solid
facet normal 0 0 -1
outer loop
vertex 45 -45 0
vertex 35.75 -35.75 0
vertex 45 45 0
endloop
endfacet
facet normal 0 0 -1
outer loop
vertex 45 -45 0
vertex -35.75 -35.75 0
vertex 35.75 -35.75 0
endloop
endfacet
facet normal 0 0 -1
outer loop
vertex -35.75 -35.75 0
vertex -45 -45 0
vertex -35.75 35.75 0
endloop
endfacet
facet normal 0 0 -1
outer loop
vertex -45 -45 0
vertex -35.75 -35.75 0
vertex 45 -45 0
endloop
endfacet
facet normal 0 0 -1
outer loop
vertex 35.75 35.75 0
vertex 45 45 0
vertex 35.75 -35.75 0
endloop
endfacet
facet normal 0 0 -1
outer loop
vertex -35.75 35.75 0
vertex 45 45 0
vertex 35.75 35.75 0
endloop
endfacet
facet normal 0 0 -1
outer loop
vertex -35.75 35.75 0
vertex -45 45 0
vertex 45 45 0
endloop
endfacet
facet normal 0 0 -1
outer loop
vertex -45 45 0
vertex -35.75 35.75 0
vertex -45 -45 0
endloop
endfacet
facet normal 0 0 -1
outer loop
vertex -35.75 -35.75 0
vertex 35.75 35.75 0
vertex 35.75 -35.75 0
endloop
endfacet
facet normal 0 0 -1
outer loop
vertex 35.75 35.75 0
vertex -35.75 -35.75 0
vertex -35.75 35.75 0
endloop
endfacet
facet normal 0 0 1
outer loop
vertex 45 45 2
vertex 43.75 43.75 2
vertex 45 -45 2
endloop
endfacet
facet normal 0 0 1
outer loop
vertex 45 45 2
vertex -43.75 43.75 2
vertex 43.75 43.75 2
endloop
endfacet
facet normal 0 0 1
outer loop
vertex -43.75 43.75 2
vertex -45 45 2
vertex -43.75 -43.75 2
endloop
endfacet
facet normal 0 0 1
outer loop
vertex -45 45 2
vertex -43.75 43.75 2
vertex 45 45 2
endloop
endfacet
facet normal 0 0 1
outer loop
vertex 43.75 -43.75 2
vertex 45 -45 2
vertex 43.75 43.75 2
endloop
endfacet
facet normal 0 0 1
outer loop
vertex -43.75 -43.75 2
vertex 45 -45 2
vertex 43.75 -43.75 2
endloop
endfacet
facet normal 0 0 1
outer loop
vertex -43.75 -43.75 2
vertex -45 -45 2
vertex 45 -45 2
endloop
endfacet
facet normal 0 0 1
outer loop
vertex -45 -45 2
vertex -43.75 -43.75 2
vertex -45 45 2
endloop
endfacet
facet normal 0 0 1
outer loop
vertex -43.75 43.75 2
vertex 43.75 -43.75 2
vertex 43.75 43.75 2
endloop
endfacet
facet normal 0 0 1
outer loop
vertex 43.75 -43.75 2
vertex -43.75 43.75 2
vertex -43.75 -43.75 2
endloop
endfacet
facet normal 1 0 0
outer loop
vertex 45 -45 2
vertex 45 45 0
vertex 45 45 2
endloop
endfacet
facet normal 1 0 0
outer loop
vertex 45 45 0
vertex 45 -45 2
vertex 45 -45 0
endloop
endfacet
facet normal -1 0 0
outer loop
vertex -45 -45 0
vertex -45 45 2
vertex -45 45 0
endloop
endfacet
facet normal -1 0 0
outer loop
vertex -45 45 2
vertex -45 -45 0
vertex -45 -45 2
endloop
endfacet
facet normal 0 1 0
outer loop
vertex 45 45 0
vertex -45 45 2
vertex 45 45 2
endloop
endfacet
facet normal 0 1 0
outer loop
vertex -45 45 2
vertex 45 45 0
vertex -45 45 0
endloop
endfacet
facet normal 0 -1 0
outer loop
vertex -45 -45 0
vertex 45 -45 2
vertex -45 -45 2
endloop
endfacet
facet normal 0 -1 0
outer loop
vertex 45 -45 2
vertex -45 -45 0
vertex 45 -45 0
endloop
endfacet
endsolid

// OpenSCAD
// Built by bench/smallmodels/features/compiler.py from a list of features.
$fn = 64;
difference() {
  union() {
    translate([0, 0, 0]) translate([-45, -45, 0]) cube([90, 90, 2]);
  }
  union() {
    translate([0, 0, -2]) rotate([0, 0, 0]) translate([-35.75, -35.75, 0]) cube([71.5, 71.5, 2]);
    translate([0, -135, 2]) rotate([0, 0, 0]) translate([-45, -1.25, 0]) cube([90, 2.5, 40]);
    translate([0, -45, 2]) rotate([0, 0, 0]) translate([-45, -1.25, 0]) cube([90, 2.5, 40]);
    translate([0, 45, 2]) rotate([0, 0, 0]) translate([-45, -1.25, 0]) cube([90, 2.5, 40]);
    translate([0, 135, 2]) rotate([0, 0, 0]) translate([-45, -1.25, 0]) cube([90, 2.5, 40]);
    translate([-135, 0, 2]) rotate([0, 0, 0]) translate([-1.25, -45, 0]) cube([2.5, 90, 40]);
    translate([-45, 0, 2]) rotate([0, 0, 0]) translate([-1.25, -45, 0]) cube([2.5, 90, 40]);
    translate([45, 0, 2]) rotate([0, 0, 0]) translate([-1.25, -45, 0]) cube([2.5, 90, 40]);
    translate([135, 0, 2]) rotate([0, 0, 0]) translate([-1.25, -45, 0]) cube([2.5, 90, 40]);
  }
}
